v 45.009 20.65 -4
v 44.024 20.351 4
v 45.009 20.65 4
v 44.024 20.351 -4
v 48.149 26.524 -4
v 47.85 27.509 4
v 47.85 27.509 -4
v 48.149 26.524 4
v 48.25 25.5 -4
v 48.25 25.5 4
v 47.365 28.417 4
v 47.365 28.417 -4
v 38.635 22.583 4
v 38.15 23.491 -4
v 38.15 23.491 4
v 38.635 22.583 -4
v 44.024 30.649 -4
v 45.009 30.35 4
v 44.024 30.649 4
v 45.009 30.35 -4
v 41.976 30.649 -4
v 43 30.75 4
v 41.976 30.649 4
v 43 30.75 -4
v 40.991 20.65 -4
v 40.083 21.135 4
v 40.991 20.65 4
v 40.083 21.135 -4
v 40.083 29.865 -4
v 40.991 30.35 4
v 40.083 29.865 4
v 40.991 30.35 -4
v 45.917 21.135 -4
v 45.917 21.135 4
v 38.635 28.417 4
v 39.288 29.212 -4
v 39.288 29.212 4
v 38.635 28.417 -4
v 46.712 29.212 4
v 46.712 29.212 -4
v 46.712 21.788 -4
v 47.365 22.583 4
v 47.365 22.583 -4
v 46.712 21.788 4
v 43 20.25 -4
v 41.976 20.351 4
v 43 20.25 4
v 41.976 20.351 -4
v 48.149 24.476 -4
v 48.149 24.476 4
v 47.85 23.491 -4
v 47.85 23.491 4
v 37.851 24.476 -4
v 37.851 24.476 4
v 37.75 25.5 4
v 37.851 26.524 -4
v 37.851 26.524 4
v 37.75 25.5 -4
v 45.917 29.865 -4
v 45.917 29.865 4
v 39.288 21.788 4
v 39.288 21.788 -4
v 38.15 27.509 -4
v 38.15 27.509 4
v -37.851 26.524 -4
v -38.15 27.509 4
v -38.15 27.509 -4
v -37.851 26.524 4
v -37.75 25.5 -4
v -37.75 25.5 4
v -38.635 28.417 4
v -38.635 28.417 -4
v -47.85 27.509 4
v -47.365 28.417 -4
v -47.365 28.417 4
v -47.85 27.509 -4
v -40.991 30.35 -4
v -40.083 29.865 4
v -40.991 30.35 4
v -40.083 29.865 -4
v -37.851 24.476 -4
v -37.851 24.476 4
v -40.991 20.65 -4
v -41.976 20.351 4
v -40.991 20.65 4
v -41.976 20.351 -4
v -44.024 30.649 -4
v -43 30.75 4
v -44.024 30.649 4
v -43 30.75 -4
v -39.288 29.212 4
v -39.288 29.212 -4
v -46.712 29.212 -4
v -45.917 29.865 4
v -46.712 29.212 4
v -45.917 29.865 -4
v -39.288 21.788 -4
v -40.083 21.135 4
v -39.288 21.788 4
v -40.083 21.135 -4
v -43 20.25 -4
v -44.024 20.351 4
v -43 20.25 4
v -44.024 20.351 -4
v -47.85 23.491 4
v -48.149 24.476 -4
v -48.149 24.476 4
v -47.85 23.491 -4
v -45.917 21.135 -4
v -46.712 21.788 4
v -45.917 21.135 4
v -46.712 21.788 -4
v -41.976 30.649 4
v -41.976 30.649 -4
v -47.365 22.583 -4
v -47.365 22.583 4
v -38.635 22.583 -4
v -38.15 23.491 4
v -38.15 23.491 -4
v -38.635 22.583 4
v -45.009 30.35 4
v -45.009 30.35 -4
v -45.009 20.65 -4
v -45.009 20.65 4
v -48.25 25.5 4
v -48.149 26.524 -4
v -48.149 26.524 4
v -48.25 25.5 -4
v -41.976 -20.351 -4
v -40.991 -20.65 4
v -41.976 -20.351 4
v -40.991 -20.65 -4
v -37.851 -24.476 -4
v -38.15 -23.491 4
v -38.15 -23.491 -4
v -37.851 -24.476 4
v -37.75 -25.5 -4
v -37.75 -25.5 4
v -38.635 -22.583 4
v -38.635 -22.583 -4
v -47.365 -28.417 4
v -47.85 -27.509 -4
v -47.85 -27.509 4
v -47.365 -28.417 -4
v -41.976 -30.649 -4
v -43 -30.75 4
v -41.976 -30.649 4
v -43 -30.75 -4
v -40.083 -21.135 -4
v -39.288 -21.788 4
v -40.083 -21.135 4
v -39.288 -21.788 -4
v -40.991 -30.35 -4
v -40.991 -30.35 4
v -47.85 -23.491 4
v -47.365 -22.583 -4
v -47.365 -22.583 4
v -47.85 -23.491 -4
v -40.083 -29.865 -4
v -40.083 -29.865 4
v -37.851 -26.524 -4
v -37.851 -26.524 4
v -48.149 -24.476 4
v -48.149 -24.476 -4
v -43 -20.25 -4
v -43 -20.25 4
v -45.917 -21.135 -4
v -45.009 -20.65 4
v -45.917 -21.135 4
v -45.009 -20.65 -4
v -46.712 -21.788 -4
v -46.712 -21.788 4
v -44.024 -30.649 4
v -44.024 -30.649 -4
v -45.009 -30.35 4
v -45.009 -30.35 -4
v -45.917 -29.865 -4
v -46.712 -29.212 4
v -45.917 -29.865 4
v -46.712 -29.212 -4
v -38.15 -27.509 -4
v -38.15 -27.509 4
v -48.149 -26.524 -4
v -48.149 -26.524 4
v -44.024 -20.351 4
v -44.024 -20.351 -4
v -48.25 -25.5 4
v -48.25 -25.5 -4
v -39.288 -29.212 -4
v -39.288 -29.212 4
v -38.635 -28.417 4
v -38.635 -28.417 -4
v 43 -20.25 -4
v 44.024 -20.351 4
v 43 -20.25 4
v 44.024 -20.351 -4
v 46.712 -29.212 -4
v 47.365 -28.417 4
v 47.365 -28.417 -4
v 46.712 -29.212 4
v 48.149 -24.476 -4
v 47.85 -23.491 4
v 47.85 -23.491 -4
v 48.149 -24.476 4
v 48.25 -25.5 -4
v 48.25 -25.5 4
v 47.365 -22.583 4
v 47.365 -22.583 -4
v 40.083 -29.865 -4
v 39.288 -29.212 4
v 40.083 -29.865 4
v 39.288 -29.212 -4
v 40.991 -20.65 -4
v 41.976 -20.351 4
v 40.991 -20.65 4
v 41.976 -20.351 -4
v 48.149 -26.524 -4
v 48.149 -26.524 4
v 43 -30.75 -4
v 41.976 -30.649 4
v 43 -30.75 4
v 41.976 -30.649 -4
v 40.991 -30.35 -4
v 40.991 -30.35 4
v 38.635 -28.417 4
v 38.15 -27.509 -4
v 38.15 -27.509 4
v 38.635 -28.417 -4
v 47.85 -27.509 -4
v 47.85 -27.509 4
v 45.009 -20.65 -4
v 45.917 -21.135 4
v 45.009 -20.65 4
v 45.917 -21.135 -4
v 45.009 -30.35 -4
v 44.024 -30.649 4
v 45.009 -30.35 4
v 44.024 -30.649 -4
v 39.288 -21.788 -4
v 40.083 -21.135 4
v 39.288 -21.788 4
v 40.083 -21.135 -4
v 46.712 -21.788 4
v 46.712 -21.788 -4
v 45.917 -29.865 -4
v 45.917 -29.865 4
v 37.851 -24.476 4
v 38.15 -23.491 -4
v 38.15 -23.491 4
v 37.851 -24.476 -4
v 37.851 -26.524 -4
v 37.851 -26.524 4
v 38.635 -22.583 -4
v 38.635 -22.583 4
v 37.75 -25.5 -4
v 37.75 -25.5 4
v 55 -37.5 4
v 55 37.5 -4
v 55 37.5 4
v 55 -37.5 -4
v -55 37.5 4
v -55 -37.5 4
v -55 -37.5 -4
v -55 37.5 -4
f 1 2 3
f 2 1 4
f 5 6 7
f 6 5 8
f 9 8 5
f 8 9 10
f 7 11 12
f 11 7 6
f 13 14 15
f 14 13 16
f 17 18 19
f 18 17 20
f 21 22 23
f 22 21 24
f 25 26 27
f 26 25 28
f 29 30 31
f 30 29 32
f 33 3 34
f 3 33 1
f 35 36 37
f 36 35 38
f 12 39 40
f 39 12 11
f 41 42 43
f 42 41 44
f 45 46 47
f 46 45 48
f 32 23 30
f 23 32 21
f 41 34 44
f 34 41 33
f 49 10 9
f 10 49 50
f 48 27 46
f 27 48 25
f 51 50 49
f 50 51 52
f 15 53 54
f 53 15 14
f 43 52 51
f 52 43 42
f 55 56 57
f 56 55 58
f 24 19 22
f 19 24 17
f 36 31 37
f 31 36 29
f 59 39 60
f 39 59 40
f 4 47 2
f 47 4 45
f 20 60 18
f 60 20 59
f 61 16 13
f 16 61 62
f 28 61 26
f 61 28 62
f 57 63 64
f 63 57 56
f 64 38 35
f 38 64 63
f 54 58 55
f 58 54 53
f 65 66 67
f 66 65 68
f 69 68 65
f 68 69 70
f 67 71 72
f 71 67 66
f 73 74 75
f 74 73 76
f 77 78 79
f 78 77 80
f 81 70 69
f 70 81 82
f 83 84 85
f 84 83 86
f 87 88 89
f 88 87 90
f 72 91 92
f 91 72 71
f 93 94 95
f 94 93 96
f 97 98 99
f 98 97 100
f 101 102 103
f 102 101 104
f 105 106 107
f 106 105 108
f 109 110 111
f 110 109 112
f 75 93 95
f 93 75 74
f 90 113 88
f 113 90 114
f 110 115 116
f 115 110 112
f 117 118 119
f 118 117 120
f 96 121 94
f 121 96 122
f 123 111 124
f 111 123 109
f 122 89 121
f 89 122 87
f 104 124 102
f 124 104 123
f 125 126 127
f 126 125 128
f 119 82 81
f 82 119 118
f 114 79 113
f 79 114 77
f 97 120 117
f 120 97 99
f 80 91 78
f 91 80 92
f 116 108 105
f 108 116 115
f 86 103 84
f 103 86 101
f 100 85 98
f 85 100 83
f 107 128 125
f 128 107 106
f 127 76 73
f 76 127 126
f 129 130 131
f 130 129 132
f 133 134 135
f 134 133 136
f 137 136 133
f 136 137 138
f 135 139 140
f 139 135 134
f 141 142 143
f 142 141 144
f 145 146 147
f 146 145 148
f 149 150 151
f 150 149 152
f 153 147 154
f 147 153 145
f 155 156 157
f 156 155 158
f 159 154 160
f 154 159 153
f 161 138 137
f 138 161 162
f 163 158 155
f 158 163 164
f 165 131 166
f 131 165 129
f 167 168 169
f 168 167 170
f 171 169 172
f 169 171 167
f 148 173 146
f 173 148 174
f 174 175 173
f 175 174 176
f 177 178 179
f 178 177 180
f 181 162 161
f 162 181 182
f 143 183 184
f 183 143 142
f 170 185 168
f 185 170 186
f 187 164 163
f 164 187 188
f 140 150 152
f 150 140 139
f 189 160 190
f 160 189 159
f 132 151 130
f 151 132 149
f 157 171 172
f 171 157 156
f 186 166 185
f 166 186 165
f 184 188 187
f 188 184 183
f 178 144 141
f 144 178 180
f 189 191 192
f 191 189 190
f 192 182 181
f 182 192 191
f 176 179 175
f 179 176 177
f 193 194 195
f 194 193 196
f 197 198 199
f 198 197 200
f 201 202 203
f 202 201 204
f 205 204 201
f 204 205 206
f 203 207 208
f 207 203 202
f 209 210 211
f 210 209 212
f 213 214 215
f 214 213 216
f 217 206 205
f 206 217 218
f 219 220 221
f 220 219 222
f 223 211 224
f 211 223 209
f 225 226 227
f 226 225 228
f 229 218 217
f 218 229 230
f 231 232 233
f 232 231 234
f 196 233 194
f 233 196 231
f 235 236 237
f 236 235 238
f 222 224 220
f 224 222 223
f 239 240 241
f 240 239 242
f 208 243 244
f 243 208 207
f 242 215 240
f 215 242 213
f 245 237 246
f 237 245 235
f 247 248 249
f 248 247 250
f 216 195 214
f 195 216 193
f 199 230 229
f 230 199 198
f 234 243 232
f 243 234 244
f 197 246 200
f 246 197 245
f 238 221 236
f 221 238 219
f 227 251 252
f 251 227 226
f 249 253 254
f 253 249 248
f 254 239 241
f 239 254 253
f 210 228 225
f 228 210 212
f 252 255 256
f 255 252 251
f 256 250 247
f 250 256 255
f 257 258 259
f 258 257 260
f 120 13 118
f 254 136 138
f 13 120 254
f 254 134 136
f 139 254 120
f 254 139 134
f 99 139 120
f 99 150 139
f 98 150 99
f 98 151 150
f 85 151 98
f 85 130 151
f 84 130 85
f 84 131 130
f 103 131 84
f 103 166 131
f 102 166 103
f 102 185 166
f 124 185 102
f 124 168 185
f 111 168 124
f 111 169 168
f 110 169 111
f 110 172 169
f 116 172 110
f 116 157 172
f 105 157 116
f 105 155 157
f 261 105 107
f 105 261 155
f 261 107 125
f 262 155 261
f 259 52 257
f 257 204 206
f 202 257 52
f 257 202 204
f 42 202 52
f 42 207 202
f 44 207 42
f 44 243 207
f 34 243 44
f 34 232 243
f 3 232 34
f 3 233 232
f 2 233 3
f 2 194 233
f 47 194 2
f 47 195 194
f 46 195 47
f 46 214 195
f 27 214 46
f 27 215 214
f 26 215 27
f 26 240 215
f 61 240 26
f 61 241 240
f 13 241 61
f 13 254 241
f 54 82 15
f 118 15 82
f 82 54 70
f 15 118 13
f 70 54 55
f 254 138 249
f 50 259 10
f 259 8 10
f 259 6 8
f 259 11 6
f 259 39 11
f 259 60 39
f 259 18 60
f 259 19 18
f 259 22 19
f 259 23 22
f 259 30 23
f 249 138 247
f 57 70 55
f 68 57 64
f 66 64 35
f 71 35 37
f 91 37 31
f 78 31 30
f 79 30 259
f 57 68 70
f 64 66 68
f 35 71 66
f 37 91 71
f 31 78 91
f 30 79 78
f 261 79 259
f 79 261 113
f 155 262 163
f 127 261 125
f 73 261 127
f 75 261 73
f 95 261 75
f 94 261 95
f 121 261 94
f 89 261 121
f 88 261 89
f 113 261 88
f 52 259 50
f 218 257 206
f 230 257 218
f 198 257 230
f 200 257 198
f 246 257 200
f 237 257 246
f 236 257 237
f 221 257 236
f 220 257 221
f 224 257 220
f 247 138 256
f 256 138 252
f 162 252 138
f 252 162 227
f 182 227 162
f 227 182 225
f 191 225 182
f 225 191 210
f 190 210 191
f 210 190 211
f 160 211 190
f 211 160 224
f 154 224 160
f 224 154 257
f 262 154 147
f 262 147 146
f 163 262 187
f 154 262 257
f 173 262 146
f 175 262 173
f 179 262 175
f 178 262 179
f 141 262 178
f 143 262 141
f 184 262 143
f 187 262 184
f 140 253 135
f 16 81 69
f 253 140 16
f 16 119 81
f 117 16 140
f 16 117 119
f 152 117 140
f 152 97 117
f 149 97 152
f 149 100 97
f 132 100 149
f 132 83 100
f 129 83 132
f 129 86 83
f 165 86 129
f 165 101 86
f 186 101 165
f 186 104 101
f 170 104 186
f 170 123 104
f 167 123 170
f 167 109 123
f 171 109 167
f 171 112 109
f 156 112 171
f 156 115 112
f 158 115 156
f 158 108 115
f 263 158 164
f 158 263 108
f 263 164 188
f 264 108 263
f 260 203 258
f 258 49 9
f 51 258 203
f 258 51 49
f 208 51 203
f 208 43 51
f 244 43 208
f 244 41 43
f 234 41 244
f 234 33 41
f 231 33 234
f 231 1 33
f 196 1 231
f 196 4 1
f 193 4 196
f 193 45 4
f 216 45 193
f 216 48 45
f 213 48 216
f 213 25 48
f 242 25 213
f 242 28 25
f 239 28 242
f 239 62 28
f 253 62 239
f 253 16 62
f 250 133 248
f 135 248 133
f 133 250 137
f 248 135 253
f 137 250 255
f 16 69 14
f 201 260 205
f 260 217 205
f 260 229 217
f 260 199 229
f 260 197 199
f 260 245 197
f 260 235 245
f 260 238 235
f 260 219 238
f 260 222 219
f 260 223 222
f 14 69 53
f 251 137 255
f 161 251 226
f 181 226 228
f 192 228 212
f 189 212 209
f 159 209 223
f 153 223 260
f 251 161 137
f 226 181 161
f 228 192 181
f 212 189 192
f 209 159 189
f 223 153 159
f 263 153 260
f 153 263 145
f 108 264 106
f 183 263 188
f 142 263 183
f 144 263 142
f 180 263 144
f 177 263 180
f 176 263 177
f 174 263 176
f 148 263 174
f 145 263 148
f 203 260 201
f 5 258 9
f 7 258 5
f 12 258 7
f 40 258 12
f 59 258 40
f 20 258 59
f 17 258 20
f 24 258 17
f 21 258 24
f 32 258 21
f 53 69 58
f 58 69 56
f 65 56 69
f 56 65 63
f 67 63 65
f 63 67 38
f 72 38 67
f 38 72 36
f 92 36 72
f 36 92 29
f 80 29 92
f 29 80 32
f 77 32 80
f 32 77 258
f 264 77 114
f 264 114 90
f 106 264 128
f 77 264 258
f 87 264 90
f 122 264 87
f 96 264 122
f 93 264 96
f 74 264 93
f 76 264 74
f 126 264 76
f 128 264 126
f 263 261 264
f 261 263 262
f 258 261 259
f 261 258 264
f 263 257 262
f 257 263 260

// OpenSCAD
$fn = 32;

// ----------------------------------------------------------------------
// Corner plate 110 x 75 x 8
// 4 holes, centres taken from the edge offset
// ----------------------------------------------------------------------

// --- parameters (mm) ---
plate = [110, 75, 8];  // overall size (x, y, z)
holes = 4;             // number of holes the drawing asks for
hole_d = 10.5;         // hole diameter
edge = 12;             // hole centre offset from the plate edge

// --- derived feature positions (mm) ---
corner_x = plate[0] / 2 - edge;  // = 43   corner hole X
corner_y = plate[1] / 2 - edge;  // = 25.5   corner hole Y
feature_centers = [
  [corner_x, corner_y],
  [-corner_x, corner_y],
  [-corner_x, -corner_y],
  [corner_x, -corner_y]
];   // hole centres the loop below drills

// plate outline, every hole drilled through with the same cutters
difference() {
  cube(plate, center = true);
  for (centre = feature_centers)
    translate([centre[0], centre[1], 0])
      cylinder(d = hole_d, h = plate[2] + 2, center = true);
}
